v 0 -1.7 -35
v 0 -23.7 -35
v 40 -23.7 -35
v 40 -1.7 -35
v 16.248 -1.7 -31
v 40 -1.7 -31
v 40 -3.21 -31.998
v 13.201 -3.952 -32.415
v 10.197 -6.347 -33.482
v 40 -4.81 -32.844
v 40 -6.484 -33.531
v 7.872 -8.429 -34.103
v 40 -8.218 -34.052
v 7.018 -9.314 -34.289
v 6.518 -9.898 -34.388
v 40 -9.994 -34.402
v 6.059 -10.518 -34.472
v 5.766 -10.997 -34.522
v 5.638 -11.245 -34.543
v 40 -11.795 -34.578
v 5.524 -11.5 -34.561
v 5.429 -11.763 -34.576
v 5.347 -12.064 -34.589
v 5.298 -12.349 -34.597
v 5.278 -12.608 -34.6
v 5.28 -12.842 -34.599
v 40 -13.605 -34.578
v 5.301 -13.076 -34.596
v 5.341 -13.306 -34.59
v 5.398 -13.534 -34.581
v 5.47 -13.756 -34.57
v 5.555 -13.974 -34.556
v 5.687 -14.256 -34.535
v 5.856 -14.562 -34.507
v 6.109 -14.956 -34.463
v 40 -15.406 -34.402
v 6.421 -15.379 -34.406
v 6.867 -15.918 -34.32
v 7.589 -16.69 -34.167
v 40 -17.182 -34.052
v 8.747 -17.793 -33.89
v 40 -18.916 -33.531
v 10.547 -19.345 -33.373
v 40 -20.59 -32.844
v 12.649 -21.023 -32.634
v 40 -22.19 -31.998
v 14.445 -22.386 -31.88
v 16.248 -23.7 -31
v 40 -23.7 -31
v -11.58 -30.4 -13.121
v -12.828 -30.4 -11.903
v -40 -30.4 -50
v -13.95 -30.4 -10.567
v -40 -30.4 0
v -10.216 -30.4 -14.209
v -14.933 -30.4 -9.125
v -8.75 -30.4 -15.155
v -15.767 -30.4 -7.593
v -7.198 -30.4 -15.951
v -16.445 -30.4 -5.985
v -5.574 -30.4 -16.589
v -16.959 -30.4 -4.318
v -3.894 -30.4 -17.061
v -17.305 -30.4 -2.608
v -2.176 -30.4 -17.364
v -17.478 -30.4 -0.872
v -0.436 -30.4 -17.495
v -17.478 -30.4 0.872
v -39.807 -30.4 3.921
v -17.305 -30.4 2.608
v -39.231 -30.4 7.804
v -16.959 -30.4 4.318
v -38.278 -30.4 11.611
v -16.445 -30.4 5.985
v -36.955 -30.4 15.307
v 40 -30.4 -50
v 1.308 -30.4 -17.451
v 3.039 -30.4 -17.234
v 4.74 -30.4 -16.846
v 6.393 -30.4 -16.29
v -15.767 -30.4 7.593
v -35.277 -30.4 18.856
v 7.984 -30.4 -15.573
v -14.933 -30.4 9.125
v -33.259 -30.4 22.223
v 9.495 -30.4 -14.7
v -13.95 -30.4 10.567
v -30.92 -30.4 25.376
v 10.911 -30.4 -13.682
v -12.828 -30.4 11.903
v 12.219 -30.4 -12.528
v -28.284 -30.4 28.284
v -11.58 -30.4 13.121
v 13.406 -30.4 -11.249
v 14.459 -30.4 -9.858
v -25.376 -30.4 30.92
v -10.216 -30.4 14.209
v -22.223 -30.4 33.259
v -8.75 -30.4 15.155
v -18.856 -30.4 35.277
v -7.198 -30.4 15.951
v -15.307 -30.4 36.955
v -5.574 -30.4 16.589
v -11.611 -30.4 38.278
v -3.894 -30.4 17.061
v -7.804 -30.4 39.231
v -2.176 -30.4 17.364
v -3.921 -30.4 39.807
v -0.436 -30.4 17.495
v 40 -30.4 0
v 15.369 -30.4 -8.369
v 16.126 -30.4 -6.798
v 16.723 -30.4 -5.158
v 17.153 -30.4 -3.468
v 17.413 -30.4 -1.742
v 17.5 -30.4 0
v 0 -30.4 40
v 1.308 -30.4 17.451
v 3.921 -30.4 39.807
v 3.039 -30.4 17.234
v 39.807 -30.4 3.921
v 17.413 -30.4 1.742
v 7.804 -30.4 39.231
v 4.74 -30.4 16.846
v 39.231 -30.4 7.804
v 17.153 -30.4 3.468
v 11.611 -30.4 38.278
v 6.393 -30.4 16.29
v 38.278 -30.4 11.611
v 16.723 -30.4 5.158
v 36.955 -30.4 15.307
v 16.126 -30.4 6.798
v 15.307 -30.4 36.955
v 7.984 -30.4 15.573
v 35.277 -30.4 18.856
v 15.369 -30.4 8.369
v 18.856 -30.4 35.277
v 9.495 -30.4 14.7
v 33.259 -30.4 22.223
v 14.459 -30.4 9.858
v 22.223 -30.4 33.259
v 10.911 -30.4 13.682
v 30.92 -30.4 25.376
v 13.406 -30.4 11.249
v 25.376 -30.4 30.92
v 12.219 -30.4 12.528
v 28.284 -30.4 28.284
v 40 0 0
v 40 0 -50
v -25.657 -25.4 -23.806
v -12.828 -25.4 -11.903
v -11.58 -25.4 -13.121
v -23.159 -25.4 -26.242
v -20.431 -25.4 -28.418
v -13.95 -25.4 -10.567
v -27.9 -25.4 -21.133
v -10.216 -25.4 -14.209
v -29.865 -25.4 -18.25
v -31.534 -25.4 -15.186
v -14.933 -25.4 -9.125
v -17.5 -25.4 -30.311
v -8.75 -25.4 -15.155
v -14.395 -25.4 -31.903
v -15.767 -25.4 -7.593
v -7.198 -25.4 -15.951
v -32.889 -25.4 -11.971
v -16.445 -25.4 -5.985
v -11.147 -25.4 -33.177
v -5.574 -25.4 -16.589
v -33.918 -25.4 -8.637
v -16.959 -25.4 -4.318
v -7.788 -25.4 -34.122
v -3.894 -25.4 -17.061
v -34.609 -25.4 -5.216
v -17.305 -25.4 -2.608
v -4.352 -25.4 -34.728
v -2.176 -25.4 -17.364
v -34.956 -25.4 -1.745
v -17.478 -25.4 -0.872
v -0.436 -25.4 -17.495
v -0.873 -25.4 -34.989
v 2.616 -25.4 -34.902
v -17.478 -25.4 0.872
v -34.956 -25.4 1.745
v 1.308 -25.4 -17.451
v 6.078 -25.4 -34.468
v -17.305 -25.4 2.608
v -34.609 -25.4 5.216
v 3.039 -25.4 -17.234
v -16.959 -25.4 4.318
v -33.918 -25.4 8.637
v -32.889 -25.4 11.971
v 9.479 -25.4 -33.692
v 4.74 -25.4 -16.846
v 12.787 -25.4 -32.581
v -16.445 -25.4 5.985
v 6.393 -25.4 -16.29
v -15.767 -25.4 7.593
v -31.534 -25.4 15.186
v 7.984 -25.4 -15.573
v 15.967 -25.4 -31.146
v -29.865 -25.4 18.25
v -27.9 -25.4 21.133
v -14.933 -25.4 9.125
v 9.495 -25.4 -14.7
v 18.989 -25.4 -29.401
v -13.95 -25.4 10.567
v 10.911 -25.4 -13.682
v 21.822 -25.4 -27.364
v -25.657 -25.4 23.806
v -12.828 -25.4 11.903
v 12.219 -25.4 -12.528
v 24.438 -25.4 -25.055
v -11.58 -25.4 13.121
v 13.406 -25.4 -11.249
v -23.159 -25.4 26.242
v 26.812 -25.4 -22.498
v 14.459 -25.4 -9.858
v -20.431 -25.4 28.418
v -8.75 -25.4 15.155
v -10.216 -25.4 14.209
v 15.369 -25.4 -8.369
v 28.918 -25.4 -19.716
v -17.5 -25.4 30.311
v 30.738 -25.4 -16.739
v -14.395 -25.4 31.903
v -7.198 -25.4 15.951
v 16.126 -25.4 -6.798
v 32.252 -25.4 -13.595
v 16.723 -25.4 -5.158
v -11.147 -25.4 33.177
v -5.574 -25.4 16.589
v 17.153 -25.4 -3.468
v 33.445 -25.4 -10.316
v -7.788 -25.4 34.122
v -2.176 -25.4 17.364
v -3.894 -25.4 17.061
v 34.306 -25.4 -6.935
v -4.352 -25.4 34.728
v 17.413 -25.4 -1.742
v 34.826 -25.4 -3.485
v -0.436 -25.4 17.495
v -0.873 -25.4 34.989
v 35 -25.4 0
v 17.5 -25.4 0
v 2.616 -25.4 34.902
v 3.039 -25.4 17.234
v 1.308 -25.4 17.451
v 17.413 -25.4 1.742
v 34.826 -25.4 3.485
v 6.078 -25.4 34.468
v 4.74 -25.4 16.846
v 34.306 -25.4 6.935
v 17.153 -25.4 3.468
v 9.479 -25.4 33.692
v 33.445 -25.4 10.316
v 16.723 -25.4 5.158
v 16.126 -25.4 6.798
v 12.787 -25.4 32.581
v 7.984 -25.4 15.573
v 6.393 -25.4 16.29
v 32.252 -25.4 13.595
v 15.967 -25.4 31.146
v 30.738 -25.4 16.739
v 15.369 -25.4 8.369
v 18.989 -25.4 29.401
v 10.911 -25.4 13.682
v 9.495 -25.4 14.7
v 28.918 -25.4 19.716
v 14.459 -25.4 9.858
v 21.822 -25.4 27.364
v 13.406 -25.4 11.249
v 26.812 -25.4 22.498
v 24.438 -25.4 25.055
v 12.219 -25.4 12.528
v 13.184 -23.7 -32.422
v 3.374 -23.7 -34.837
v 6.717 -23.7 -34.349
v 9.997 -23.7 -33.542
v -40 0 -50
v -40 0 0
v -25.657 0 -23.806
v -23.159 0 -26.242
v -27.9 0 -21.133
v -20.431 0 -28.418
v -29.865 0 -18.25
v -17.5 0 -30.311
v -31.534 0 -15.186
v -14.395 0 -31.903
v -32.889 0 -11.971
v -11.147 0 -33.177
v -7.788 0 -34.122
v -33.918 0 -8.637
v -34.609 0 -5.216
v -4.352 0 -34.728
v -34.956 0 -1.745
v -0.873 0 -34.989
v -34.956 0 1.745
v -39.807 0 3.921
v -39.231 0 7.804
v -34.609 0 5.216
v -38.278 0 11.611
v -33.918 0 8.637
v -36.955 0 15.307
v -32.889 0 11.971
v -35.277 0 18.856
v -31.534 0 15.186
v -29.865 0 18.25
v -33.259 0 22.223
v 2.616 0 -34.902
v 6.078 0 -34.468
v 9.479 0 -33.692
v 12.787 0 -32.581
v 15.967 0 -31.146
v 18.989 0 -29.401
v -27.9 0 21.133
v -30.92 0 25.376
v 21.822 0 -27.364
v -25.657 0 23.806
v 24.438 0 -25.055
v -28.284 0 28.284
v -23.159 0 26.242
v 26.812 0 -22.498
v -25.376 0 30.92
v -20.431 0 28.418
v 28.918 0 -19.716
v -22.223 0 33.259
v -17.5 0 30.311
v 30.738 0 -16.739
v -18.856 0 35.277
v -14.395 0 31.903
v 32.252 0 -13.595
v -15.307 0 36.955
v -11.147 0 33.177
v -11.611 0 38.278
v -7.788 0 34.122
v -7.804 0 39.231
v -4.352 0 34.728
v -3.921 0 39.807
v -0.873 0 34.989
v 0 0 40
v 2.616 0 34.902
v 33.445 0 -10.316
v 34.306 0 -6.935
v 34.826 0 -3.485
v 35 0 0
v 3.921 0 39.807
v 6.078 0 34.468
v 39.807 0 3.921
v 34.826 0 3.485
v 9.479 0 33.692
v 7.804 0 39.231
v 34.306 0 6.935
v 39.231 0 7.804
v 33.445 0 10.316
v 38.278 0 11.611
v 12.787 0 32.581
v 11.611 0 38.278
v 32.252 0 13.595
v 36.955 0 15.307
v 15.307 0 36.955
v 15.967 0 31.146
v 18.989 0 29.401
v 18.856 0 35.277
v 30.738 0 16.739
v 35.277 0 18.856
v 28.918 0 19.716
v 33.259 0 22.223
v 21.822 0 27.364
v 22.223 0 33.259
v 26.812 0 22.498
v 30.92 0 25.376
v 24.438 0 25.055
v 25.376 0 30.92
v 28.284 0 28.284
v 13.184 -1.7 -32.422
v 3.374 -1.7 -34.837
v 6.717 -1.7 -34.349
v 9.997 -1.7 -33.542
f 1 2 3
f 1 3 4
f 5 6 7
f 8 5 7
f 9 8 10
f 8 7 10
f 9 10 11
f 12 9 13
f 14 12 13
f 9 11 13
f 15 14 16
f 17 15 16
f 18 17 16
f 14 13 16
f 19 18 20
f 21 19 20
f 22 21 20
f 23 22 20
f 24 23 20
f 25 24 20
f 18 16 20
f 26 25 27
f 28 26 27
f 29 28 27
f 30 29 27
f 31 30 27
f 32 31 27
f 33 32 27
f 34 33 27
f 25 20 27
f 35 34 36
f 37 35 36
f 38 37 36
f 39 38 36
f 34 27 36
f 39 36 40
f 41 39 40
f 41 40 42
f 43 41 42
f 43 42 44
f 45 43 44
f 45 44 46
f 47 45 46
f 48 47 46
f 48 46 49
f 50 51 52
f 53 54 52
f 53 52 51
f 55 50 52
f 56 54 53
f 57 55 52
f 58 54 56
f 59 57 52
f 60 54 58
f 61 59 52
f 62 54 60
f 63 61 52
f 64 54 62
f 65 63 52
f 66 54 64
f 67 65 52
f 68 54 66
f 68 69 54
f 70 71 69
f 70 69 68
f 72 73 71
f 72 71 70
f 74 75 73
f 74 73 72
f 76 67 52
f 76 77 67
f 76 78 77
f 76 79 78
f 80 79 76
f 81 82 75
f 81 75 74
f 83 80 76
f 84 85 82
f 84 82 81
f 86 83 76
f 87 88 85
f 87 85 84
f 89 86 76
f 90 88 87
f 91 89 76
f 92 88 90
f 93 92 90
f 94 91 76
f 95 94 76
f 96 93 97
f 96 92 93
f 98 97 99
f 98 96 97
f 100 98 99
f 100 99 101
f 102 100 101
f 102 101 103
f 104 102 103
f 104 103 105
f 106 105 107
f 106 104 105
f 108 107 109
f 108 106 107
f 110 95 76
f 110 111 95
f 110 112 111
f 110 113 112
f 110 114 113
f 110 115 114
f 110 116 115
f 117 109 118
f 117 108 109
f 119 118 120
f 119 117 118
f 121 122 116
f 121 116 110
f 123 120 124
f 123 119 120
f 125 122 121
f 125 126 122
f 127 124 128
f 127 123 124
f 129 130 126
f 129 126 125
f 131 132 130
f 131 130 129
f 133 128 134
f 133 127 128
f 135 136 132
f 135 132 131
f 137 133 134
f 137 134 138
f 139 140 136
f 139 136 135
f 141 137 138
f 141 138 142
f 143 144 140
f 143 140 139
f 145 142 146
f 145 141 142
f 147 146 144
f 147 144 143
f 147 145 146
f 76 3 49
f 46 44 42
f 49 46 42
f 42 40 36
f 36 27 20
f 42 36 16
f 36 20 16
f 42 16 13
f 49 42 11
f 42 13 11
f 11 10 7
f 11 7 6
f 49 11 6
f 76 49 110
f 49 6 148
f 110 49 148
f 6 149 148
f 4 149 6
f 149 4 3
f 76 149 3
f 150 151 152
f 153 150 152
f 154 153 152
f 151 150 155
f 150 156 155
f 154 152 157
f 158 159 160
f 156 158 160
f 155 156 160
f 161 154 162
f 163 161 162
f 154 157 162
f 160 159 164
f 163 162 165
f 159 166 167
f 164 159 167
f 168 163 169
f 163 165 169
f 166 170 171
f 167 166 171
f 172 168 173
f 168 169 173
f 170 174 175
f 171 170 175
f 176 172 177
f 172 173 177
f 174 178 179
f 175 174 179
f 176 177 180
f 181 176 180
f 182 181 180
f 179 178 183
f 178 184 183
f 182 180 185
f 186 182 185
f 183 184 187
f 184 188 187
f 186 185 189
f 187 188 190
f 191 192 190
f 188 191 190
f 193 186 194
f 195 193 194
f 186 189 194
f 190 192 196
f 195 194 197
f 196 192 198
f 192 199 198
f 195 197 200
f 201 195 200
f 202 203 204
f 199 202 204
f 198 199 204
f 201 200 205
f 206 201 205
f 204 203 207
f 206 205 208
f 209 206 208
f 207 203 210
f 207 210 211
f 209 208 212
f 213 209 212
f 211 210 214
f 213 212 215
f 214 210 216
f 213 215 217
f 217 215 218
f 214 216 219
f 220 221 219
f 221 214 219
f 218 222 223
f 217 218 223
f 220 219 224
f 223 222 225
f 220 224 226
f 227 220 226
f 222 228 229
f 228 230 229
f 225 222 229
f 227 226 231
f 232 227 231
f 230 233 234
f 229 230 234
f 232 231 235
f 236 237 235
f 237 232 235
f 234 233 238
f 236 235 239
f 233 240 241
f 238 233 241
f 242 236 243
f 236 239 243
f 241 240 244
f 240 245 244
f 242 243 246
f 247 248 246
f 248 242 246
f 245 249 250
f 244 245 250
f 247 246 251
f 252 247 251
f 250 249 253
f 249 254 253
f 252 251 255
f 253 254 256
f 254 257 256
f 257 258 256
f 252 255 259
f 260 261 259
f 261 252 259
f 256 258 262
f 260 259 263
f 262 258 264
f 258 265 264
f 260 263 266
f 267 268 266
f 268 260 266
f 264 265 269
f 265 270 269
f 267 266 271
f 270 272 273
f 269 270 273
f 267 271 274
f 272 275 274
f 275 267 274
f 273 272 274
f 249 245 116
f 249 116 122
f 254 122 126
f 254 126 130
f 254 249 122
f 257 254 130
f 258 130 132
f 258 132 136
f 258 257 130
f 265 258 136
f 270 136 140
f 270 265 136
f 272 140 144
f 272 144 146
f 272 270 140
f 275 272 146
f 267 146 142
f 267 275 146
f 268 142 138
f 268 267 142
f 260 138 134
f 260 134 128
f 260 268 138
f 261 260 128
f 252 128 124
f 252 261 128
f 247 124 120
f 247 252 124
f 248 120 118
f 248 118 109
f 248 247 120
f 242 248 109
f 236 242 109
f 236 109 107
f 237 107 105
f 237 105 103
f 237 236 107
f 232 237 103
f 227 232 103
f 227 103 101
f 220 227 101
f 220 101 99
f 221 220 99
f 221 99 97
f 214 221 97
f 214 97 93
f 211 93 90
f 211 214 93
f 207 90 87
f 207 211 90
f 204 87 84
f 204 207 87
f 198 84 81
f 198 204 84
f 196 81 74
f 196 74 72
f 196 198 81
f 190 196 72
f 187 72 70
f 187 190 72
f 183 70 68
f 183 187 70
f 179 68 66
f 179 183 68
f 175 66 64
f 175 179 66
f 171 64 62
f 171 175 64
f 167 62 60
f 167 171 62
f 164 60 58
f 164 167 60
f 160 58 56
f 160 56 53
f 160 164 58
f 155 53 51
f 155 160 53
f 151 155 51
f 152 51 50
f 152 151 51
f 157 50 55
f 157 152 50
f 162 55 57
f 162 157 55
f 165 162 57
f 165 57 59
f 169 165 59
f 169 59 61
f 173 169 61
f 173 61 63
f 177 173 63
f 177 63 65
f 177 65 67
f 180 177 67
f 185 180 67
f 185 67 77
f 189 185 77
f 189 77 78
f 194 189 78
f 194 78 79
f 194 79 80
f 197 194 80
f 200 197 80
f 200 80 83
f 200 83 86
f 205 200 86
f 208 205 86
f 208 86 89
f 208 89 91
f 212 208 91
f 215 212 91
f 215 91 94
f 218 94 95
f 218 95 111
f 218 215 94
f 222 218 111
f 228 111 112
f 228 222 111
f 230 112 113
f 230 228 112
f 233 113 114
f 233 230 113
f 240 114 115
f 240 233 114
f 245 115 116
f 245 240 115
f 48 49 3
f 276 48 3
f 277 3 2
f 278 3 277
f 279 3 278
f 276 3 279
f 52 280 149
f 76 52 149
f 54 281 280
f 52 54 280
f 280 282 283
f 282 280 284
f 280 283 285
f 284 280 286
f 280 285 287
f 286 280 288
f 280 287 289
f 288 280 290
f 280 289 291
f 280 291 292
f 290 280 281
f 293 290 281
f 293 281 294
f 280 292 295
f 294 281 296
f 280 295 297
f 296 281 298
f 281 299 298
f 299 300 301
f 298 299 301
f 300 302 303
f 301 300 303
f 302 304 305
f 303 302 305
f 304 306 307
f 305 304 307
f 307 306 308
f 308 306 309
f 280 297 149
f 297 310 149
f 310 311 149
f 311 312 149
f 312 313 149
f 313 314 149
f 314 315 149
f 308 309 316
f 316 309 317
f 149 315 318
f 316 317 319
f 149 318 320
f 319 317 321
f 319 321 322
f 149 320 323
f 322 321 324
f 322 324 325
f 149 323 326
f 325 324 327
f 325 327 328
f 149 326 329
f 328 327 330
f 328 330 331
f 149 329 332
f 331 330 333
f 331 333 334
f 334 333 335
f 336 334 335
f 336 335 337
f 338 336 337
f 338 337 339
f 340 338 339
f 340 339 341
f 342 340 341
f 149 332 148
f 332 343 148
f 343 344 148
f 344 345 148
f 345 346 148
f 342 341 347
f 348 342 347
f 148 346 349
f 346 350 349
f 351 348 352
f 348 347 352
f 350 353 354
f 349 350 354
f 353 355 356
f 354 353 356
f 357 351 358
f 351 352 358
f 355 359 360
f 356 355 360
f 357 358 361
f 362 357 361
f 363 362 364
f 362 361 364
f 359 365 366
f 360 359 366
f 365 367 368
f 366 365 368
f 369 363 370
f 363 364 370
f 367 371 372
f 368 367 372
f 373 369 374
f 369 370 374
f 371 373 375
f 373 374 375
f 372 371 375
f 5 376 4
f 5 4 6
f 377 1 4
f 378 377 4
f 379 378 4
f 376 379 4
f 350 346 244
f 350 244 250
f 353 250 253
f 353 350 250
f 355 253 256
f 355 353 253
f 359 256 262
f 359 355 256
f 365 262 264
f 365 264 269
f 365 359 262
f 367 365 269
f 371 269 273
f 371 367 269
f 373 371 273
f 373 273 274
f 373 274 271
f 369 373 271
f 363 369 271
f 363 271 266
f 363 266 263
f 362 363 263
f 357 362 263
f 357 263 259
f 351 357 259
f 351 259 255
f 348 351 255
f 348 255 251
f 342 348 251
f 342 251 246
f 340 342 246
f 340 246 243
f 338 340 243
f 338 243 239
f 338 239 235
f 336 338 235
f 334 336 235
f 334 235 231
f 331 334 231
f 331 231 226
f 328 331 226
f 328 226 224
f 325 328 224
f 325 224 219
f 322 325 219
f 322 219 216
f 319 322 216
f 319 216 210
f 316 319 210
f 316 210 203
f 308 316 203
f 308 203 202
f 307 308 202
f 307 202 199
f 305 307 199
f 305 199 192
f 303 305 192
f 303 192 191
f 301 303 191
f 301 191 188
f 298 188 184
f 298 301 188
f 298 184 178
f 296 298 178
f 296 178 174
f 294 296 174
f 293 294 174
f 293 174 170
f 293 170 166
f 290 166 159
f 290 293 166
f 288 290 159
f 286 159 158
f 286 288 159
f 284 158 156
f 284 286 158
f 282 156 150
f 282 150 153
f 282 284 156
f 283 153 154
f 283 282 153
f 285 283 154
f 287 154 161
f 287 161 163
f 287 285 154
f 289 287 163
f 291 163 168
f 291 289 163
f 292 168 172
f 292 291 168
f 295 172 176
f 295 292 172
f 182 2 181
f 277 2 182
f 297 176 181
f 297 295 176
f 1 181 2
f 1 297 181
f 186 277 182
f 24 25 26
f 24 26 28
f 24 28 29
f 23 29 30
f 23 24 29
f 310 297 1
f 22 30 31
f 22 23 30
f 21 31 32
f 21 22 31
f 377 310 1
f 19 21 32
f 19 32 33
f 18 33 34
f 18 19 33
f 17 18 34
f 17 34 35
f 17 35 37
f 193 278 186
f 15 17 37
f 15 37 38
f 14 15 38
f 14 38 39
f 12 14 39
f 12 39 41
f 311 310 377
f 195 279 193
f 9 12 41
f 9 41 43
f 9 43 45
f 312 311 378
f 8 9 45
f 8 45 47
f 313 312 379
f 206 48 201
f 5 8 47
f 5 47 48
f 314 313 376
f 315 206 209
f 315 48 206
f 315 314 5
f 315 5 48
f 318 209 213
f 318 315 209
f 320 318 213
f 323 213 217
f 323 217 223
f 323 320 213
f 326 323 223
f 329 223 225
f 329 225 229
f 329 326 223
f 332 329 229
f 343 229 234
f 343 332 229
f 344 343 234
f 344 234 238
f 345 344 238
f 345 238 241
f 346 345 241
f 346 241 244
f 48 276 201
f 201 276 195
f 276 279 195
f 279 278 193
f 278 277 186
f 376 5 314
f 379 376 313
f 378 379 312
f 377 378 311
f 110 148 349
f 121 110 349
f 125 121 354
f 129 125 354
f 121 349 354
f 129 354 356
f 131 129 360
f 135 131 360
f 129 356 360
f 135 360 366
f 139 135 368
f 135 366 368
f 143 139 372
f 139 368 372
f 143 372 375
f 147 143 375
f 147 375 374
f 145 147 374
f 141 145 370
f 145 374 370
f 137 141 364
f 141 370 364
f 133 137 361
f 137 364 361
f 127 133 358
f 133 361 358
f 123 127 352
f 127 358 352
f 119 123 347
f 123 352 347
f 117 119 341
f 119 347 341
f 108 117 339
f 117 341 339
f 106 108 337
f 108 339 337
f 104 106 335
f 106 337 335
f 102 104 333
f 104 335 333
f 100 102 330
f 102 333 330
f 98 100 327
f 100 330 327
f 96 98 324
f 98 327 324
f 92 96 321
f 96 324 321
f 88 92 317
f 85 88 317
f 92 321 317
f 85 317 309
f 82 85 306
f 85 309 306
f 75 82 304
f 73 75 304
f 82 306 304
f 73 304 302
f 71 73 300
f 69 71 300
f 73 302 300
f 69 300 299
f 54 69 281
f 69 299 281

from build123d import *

# Parameters (mm, degrees)
F0_R      = 35
F1_DEPTH  = 25.4
F3_DEPTH  = 25
F5_DEPTH  = 40
F6_R      = 17.5
F7_DEPTH  = 5
F8_DEPTH  = 5
F9_W      = 80
F9_H      = 25
F10_DEPTH = 25


with BuildPart() as f1:
    # F0 (on Front) → F1 (new body)
    with BuildSketch(Plane.XZ):
        with BuildLine():
            Line((40, -50), (40, 0))
            ThreePointArc((40, 0), (0, 40), (-40, 0))
            Line((-40, 0), (-40, -50))
            Line((-40, -50), (40, -50))
        make_face()
        Circle(F0_R, mode=Mode.SUBTRACT)
    extrude(amount=F1_DEPTH)

    # F2 (on face) → F3 (join)
    with BuildSketch(Plane.XZ.offset(25.4)):
        with BuildLine():
            Line((-40, -25), (-40, -50))
            Line((-40, -50), (40, -50))
            Line((40, -50), (40, -25))
            Line((40, -25), (24.4948974278, -25))
            ThreePointArc((24.4948974278, -25), (0, -35), (-24.4948974278, -25))
            Line((-24.4948974278, -25), (-40, -25))
        make_face()
        with BuildLine():
            Line((24.4948974278, -25), (-24.4948974278, -25))
            ThreePointArc((-24.4948974278, -25), (0, -35), (24.4948974278, -25))
        make_face()
    extrude(amount=F3_DEPTH)

    # F4 (on face) → F5 (cut)
    with BuildSketch(Plane.YZ.offset(40)):
        with BuildLine():
            Line((-23.7, -35), (-1.7, -35))
            Line((-1.7, -35), (-1.7, -31))
            ThreePointArc((-1.7, -31), (-12.7, -34.6), (-23.7, -31))
            Line((-23.7, -31), (-23.7, -35))
        make_face()
    extrude(amount=-F5_DEPTH, mode=Mode.SUBTRACT)

    # F6 (on face) → F7 (join)
    with BuildSketch(Plane.XZ.offset(25.4)):
        with BuildLine():
            Line((-40, 0), (-40, -25))
            Line((-40, -25), (40, -25))
            Line((40, -25), (40, 0))
            ThreePointArc((40, 0), (0, 40), (-40, 0))
        make_face()
        Circle(F6_R, mode=Mode.SUBTRACT)
    extrude(amount=F7_DEPTH)

    # F8 (add): a face of the model
    f8_faces = [f1.faces().sort_by_distance(p)[0] for p in [
        (0, -50.4, -37.5),
    ]]
    extrude(f8_faces, amount=F8_DEPTH)

    # F9 (on face) → F10 (cut)
    with BuildSketch(Plane.XY.offset(-25)):
        with Locations((0, -42.9)):
            Rectangle(F9_W, F9_H)
    extrude(amount=-F10_DEPTH, mode=Mode.SUBTRACT)


solid = f1.part
